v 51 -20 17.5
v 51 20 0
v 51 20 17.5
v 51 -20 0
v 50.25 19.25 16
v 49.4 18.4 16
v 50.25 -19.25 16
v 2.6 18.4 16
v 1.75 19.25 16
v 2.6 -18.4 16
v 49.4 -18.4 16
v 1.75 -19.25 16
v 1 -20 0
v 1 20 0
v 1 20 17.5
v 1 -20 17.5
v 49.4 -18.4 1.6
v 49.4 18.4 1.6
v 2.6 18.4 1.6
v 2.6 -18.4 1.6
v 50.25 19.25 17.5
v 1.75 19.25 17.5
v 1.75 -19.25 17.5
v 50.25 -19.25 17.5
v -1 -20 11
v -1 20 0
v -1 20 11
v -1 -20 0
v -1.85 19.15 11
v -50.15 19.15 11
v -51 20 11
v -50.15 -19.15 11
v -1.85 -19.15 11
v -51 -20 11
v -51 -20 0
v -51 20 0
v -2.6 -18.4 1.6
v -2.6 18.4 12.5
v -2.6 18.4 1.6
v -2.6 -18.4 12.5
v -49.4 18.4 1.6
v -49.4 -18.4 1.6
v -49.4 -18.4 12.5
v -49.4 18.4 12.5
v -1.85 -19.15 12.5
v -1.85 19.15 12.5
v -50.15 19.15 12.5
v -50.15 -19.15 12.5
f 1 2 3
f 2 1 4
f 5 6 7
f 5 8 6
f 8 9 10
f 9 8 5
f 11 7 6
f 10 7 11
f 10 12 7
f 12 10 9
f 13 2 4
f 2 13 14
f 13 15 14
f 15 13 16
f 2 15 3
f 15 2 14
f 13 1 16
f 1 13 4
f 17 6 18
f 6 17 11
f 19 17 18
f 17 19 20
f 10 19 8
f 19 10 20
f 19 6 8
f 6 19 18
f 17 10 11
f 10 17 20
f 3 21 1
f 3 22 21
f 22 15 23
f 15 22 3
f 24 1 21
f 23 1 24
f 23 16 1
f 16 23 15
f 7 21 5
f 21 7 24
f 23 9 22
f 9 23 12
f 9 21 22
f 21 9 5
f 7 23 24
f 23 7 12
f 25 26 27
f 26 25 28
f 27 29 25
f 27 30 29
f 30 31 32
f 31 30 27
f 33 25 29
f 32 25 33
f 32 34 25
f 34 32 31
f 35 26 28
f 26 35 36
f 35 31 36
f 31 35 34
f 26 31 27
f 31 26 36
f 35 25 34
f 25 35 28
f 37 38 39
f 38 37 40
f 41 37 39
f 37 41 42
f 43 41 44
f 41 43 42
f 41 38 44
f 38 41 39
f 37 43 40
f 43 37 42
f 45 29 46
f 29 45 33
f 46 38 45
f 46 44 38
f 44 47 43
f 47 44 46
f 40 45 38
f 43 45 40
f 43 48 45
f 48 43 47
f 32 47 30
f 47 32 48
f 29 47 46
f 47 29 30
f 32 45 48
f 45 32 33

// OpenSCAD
$fn = 100;

module box(size, border) difference() {
  center = true;
  cube(size, center);

  cube(size - border, center);
  translate([ 0, 0, (size.z / 2) - (border.z / 2) ])
      cube([ size.x - border.x, size.y - border.y, border.z * 1.01 ], center);
}

module walls(size, border) difference() {
  center = true;

  cube(size, center);
  cube([ size.x - border.x, size.y - border.y, size.z * 1.01 ], center);
}

box_size = [ 50, 40 ];
box_border = [ 3.2, 3.2, 3.2 ];

taller_box_size = [ box_size.x, box_size.y, 16 ];
shorter_box_size = [ box_size.x, box_size.y, 11 ];

// junction_size = ;
junction_height = 1.5;
junction_border = [ 1.5, 1.5 ];

translate([ box_size.x / 2 + 1, 0, taller_box_size.z / 2 ]) {
  box(taller_box_size, box_border);

  translate([ 0, 0, (taller_box_size.z / 2) + (junction_height / 2) ])
      walls([ box_size.x, box_size.y, junction_height ], junction_border);
}

translate([ -box_size.x / 2 - 1, 0, shorter_box_size.z / 2 ]) {
  box(shorter_box_size, box_border);
  translate([ 0, 0, (shorter_box_size.z / 2) + (junction_height / 2) ]) walls(
      [
        box_size.x - box_border.x + junction_border.x,
        box_size.y - box_border.y + junction_border.y,
        junction_height
      ],
      junction_border);
}
